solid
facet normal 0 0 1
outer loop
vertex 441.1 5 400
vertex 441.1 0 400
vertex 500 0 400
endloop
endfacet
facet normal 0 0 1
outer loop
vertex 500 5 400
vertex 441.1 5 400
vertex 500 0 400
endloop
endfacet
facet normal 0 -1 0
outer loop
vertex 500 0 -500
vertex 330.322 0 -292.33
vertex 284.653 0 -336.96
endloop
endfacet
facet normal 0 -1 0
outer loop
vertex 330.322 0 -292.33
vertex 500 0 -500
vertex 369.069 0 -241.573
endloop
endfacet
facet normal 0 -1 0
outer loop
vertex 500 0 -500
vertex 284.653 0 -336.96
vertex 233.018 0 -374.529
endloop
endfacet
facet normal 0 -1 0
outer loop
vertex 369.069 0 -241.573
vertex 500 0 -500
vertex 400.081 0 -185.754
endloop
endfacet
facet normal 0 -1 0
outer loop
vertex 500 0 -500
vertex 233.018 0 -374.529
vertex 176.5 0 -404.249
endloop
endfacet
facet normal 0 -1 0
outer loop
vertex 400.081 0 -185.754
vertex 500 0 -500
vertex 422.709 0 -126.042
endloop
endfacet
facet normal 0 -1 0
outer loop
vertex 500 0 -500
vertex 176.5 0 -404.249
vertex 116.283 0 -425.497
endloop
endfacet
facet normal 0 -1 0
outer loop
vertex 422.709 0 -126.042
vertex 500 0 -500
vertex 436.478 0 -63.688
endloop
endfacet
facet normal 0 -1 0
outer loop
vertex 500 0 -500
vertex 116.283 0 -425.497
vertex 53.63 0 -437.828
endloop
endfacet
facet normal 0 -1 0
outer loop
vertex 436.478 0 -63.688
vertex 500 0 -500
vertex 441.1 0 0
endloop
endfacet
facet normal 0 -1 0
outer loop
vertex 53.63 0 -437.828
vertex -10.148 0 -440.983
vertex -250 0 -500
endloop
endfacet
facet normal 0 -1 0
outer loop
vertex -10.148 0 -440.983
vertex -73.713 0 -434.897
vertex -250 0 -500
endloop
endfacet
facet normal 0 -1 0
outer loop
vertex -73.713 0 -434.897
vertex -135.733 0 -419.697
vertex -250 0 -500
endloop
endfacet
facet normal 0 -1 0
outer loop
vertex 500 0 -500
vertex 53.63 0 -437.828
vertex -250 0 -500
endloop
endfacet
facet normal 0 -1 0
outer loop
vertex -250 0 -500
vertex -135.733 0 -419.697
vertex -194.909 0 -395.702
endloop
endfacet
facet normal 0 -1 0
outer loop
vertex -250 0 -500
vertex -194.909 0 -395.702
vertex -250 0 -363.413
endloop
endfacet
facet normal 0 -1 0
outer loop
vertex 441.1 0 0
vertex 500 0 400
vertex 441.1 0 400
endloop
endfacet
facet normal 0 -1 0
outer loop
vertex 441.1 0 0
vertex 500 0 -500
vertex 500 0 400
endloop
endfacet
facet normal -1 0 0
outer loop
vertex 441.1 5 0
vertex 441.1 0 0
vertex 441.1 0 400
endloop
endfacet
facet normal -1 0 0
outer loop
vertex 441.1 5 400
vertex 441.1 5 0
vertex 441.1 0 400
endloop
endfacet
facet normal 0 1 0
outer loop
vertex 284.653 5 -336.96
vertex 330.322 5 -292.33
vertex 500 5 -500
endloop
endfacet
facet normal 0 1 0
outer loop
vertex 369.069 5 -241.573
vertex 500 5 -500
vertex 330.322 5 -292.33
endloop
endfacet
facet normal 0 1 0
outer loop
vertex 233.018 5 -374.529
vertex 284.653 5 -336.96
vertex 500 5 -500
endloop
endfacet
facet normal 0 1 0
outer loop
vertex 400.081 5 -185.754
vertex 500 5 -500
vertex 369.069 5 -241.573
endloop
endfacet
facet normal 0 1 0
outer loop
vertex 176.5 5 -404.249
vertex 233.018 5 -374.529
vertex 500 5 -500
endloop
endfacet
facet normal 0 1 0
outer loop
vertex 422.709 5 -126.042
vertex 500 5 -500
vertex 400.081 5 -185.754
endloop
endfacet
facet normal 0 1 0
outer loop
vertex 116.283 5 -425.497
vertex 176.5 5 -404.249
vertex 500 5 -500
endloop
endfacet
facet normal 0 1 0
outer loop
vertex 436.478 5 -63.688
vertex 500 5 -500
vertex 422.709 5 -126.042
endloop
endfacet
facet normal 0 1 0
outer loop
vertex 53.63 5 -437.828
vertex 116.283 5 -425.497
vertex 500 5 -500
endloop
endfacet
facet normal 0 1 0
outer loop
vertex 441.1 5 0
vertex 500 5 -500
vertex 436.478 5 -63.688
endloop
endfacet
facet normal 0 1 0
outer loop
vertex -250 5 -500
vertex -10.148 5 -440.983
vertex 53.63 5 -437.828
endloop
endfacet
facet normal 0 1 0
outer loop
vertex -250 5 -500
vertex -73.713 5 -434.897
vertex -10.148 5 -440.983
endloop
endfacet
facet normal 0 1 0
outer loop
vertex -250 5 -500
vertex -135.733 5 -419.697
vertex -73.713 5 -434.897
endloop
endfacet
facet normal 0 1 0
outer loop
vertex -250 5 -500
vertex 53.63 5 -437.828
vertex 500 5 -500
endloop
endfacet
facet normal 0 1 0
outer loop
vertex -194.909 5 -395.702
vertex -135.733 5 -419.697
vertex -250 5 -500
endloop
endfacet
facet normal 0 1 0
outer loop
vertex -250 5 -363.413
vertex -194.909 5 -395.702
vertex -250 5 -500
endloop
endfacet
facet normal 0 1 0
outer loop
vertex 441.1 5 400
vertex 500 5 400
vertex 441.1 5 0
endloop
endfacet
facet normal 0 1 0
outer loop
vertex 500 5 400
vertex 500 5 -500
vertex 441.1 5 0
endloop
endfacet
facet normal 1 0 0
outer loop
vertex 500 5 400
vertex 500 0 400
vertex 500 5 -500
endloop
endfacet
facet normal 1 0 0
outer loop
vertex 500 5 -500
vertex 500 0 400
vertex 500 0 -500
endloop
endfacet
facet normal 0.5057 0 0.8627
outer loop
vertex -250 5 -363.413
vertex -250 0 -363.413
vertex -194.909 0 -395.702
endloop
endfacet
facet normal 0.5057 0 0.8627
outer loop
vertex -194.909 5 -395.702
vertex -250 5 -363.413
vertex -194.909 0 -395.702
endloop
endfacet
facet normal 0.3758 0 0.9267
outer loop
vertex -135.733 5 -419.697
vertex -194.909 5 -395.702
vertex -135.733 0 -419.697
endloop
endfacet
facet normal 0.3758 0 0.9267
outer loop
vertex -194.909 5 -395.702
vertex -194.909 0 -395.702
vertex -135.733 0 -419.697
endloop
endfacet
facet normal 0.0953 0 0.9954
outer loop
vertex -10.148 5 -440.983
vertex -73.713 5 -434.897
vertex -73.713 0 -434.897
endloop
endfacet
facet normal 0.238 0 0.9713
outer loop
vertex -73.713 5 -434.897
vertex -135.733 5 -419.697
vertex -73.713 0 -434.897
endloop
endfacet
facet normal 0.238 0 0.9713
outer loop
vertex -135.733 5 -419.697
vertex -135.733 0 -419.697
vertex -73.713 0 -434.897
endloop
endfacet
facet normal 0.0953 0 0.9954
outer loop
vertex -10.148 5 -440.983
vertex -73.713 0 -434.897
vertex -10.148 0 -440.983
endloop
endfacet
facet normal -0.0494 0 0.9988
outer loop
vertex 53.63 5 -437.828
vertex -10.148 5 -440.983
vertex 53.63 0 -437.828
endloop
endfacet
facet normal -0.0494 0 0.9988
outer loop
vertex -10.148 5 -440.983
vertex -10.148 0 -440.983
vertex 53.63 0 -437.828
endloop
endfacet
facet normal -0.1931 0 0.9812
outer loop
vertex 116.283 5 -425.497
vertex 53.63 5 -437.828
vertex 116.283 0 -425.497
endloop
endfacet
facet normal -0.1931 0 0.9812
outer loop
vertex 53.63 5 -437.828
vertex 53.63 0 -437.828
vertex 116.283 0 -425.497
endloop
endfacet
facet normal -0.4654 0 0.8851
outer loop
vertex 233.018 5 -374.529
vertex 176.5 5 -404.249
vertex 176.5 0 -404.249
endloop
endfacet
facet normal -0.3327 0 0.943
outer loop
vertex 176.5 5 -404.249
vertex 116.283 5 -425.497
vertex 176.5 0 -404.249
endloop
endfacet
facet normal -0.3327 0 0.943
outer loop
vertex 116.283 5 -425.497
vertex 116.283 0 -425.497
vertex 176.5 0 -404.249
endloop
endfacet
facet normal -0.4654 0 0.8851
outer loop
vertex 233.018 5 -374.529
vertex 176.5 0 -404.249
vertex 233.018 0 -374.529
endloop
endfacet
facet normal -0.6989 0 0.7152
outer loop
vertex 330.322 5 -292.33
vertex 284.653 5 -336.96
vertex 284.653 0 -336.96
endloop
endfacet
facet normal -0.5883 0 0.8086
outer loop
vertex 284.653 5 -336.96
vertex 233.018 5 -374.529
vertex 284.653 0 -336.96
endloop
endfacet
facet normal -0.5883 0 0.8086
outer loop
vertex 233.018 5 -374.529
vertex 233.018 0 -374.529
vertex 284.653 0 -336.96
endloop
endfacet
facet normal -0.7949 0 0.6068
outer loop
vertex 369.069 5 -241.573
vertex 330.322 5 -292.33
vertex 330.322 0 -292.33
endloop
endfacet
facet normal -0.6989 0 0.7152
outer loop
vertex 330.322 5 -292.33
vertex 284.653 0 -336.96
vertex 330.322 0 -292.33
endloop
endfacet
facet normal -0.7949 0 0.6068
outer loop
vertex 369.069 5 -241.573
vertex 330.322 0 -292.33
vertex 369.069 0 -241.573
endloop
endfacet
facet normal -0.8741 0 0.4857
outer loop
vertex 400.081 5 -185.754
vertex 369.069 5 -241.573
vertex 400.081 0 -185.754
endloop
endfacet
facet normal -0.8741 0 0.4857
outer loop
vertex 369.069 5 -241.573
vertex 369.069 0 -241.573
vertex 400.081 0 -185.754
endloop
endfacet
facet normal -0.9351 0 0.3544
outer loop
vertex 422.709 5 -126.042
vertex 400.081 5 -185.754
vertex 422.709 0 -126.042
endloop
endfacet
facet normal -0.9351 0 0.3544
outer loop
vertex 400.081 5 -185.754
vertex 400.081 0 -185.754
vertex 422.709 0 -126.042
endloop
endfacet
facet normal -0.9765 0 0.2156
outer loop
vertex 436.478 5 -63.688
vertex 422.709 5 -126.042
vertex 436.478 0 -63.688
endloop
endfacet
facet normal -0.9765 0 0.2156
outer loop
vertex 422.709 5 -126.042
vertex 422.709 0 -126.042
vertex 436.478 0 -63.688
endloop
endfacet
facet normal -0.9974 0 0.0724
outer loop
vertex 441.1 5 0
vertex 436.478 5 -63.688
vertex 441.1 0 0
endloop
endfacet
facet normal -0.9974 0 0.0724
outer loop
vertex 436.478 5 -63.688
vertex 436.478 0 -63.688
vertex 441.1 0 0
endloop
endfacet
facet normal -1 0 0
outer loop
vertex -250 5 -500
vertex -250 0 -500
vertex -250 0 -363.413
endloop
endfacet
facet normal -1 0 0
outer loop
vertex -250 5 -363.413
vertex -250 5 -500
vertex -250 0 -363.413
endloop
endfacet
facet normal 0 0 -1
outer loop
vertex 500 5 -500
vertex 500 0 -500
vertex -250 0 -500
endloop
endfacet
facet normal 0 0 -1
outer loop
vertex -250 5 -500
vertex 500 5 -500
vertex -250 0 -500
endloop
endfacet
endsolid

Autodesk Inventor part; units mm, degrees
ref_plane "YZ Plane" through (0, 0, 0) normal (1, 0, 0) x (0, 1, 0)
ref_plane "XZ Plane" through (0, 0, 0) normal (0, 1, 0) x (-1, 0, 0)
ref_plane "XY Plane" through (0, 0, 0) normal (0, 0, 1) x (1, 0, 0)
sketch "Sketch1" plane through (0, 0, 0) normal (0, 1, 0) x (-1, 0, 0)
  line L0 (0, 329.241) -> (0, -329.241) construction
  line L1 (203.5937, 0) -> (-203.5937, 0) construction
  arc A0 (-441.1, 0) -> (250, -363.4133) centre (0, 0) ccw
  line L2 (-441.1, 0) -> (-441.1, 400)
  line L3 (-441.1, 400) -> (-500, 400)
  line L4 (-500, 400) -> (-500, -500)
  line L5 (-500, -500) -> (250, -500)
  line L6 (250, -500) -> (250, -363.4133)
  dimension "d0" = 500
  dimension "d1" = 400
  dimension "d2" = 500
  dimension "d3" = 441.1
  dimension "d4" = 750
extrude "Extrusion1" add sketch "Sketch1" along normal blind 5
properties part number "boundaryV1"
